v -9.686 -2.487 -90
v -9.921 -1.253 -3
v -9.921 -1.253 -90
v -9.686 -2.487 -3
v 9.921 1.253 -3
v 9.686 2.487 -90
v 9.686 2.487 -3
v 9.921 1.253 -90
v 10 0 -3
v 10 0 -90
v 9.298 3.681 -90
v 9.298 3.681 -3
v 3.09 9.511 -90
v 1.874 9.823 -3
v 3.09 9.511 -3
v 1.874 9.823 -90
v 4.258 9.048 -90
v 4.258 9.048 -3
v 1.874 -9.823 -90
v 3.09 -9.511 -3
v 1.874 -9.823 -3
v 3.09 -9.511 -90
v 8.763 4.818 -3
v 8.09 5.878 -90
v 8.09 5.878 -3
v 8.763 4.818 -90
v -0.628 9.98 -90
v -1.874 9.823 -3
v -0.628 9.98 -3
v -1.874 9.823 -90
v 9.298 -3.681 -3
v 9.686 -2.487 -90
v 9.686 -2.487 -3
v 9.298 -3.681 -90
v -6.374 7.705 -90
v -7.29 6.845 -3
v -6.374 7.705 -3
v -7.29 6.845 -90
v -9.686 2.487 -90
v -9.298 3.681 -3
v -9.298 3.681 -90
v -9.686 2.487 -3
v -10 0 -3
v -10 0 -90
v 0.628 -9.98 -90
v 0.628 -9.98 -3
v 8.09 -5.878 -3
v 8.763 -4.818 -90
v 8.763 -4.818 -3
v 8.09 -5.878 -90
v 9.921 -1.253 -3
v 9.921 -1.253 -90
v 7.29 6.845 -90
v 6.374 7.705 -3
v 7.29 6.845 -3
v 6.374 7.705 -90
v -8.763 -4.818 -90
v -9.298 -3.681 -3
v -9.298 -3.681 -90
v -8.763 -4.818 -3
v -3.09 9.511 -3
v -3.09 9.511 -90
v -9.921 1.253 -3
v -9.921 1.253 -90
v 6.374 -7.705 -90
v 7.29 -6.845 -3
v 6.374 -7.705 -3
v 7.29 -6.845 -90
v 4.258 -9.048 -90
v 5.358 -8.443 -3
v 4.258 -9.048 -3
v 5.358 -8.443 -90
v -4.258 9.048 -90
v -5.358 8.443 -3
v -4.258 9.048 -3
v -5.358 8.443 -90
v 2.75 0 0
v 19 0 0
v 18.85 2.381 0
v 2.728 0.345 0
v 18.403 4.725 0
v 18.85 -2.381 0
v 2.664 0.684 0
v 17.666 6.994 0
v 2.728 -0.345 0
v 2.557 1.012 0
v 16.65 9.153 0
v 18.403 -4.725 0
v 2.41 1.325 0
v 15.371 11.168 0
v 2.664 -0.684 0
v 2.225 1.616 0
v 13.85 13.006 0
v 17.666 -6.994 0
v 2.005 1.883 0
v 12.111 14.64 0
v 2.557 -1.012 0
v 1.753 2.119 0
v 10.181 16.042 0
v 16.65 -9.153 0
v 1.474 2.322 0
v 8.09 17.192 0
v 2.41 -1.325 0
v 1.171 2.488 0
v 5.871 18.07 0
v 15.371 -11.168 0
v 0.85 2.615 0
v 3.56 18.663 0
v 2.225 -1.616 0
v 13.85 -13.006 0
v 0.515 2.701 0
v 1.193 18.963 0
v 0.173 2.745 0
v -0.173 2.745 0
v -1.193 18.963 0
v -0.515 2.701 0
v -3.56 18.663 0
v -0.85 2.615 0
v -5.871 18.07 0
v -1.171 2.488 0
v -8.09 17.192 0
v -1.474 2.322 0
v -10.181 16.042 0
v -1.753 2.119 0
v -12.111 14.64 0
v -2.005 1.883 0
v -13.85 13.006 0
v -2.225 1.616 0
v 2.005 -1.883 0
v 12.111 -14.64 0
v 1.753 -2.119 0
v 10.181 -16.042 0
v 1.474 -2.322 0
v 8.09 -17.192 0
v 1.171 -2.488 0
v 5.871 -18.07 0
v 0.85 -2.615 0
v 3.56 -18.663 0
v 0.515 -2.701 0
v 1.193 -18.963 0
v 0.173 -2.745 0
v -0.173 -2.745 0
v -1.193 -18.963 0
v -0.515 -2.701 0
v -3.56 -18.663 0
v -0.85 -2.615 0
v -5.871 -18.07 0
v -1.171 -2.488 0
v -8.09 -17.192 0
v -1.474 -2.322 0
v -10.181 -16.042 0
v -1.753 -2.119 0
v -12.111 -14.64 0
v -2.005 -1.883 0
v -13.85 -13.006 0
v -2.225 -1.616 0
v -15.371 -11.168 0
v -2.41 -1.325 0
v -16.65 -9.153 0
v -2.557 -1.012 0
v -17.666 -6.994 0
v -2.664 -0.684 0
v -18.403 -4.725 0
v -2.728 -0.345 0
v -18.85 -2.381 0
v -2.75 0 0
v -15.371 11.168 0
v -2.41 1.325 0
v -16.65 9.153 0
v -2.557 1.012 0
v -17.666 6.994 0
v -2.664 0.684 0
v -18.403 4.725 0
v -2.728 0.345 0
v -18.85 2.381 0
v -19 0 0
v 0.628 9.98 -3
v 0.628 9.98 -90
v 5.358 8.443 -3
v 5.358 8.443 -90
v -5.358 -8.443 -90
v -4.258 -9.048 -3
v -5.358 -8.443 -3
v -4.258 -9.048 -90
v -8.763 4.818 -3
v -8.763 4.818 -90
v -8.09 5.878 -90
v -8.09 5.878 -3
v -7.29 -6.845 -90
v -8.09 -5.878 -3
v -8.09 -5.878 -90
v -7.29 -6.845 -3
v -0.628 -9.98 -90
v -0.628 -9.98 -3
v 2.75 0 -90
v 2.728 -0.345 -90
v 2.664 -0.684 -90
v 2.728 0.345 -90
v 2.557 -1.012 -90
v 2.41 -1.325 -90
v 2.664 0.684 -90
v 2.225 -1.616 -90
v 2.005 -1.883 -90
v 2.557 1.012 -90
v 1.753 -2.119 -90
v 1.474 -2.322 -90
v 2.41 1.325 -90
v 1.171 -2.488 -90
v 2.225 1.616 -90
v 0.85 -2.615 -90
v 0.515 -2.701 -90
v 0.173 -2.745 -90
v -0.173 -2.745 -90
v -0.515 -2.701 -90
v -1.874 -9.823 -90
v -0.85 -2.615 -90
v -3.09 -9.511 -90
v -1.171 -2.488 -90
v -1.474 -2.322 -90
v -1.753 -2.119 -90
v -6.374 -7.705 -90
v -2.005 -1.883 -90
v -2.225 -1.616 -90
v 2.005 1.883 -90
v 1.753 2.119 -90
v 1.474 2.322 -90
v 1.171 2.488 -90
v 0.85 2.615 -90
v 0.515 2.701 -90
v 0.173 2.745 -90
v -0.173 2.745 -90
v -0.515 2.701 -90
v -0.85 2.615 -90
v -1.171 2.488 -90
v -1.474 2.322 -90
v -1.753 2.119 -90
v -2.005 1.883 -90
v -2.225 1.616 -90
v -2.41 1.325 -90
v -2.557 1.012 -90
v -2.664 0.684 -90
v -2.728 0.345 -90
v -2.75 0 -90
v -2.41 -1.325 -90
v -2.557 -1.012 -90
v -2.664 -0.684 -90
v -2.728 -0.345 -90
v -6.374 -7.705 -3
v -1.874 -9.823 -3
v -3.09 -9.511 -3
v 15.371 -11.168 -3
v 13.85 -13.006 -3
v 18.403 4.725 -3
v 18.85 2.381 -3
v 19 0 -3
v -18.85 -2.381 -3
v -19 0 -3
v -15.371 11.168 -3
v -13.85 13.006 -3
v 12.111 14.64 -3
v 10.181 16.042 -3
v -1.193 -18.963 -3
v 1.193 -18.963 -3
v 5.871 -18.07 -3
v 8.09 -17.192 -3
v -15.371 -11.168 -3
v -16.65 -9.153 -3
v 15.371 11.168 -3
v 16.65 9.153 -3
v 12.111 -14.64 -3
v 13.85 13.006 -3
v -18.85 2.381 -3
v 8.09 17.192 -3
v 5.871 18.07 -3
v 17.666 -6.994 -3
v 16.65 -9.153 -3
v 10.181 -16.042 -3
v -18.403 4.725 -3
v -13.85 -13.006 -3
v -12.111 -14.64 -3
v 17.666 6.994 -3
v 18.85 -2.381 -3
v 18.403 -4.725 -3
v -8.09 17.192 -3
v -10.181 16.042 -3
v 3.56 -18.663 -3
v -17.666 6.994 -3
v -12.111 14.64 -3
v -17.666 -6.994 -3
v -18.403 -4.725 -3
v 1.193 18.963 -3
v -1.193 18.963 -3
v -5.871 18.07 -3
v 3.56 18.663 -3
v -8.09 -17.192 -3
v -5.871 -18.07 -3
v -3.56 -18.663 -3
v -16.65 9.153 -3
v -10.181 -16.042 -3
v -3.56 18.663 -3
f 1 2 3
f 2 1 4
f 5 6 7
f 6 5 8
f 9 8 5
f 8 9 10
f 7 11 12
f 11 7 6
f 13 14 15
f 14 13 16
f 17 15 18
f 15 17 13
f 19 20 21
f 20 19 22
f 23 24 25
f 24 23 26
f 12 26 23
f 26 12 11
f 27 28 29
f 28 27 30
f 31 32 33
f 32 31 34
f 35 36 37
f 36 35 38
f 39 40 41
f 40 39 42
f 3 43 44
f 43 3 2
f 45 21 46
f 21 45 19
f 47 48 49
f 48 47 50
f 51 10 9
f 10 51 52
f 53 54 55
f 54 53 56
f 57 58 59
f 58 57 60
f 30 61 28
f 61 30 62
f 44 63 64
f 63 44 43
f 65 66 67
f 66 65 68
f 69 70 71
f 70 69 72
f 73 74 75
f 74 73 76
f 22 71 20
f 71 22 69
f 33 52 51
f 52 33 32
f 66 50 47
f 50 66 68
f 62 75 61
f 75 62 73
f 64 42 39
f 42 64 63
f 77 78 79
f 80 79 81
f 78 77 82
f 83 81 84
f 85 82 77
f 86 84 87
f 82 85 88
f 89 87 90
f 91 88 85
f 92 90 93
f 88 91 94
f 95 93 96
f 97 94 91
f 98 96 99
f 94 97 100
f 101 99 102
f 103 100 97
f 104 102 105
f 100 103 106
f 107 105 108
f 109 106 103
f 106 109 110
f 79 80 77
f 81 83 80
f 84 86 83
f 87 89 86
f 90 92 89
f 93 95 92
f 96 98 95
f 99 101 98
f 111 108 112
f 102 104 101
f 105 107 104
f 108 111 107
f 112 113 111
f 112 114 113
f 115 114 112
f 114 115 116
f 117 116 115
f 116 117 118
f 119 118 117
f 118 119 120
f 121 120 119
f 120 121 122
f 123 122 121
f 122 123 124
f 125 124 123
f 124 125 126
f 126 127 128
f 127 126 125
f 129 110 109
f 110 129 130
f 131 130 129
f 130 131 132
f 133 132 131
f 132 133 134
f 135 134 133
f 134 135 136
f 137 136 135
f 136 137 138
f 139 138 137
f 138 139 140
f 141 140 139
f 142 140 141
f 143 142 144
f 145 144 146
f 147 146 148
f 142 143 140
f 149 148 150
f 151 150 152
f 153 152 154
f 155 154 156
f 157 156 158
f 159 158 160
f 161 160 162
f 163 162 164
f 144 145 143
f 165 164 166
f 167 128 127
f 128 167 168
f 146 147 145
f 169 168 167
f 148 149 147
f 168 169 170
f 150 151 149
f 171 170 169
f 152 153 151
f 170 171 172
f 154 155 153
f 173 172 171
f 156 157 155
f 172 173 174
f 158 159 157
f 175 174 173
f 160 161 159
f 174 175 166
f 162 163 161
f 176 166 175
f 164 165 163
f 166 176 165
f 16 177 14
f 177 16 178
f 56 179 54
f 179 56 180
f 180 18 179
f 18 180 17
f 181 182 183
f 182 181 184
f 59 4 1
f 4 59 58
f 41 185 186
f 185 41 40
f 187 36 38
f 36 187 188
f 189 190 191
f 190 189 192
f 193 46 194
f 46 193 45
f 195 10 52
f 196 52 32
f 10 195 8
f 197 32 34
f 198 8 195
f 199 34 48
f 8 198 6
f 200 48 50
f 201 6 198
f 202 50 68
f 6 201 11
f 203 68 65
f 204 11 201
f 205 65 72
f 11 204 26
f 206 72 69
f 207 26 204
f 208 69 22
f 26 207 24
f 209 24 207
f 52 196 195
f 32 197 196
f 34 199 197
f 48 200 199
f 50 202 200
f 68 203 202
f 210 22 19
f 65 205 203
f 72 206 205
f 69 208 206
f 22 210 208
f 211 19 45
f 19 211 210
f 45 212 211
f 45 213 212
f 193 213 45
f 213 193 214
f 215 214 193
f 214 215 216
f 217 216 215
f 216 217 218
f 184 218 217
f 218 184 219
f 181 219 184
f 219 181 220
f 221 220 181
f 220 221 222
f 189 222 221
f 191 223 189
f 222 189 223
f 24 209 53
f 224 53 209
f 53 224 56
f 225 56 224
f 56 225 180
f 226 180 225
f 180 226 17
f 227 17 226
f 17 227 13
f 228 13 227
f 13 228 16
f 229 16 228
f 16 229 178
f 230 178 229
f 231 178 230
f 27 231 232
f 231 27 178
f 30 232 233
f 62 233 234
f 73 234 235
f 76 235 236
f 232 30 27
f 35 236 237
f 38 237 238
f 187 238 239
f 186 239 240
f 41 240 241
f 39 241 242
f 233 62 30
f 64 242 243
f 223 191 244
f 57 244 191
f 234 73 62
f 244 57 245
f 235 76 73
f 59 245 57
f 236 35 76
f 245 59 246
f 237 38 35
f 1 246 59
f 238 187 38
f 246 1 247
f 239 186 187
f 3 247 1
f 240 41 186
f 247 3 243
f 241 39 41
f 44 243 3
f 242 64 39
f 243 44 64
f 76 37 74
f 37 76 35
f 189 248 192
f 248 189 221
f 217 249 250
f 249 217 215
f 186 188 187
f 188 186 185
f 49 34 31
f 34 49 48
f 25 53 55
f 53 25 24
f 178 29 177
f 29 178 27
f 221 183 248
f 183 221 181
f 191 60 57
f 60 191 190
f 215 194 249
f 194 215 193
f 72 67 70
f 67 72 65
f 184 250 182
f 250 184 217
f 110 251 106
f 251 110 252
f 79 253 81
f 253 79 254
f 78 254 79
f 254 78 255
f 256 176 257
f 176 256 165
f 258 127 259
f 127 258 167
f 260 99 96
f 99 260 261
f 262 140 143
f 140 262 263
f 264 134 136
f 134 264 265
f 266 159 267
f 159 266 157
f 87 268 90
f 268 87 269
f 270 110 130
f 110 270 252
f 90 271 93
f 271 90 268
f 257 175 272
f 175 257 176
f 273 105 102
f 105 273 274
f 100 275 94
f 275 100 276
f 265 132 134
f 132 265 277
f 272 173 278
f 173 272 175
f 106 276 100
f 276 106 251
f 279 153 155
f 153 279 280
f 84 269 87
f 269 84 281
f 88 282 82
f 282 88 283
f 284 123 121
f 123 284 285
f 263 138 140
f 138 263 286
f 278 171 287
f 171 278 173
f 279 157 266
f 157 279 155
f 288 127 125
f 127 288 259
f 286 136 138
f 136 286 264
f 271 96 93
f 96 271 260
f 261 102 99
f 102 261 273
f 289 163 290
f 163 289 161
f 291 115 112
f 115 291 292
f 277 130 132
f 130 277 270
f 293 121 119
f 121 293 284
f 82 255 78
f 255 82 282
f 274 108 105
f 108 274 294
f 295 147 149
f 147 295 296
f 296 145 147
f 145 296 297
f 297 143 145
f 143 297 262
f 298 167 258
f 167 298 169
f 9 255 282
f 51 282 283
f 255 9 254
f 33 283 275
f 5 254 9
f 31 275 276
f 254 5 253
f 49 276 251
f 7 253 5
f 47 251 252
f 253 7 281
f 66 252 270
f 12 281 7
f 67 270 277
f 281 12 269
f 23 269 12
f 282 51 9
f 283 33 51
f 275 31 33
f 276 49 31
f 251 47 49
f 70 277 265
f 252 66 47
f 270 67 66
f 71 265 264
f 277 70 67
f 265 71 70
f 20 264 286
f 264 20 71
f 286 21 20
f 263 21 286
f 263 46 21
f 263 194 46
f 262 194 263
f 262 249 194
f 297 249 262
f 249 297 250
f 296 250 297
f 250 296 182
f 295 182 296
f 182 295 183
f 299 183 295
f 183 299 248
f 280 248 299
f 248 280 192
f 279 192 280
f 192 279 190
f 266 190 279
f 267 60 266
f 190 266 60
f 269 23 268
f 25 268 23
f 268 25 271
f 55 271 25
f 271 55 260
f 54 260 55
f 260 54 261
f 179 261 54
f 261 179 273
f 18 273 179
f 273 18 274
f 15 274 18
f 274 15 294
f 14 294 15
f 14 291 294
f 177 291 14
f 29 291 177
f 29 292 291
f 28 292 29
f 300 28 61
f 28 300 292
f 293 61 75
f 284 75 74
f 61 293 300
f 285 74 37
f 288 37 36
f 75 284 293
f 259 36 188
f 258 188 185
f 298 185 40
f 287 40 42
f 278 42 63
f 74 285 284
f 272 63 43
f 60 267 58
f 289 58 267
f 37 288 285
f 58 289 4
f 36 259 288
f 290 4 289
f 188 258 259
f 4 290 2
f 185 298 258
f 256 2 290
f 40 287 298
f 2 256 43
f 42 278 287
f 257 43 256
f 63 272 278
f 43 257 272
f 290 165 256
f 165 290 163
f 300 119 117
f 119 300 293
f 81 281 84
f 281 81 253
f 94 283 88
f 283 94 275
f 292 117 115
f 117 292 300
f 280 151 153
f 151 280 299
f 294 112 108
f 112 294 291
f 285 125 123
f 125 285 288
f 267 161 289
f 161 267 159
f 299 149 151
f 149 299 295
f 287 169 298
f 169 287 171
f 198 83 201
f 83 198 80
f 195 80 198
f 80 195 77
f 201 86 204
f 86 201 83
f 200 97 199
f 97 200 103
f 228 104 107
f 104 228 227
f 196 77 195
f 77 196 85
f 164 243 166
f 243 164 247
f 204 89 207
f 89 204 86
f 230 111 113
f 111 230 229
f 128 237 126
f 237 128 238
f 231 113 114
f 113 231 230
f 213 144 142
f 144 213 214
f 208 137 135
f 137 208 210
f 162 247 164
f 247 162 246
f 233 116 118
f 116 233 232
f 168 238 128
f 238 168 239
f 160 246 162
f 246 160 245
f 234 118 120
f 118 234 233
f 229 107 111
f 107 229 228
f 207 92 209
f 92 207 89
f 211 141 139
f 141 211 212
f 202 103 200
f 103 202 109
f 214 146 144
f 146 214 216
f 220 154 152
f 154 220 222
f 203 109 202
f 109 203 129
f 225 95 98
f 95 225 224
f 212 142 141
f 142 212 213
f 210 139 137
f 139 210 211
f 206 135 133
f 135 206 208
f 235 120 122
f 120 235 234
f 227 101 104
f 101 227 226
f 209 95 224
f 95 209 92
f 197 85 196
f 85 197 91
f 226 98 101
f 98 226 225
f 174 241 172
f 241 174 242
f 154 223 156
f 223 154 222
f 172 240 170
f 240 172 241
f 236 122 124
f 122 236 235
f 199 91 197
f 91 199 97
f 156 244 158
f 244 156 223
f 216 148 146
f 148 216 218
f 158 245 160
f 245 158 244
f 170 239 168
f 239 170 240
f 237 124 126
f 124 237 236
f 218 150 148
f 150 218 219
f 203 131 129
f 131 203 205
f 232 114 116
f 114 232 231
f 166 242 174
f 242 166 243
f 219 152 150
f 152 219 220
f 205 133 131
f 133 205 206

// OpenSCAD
$fn = 50;


difference() {
	union() {
		translate(v = [0, 0, -90.0000000000]) {
			cylinder(h = 90, r = 10.0000000000);
		}
		translate(v = [0, 0, -3.0000000000]) {
			cylinder(h = 3, r = 19.0000000000);
		}
	}
	union() {
		#translate(v = [0, 0, -90]) {
			cylinder(h = 90, r = 2.7500000000);
		}
	}
}
